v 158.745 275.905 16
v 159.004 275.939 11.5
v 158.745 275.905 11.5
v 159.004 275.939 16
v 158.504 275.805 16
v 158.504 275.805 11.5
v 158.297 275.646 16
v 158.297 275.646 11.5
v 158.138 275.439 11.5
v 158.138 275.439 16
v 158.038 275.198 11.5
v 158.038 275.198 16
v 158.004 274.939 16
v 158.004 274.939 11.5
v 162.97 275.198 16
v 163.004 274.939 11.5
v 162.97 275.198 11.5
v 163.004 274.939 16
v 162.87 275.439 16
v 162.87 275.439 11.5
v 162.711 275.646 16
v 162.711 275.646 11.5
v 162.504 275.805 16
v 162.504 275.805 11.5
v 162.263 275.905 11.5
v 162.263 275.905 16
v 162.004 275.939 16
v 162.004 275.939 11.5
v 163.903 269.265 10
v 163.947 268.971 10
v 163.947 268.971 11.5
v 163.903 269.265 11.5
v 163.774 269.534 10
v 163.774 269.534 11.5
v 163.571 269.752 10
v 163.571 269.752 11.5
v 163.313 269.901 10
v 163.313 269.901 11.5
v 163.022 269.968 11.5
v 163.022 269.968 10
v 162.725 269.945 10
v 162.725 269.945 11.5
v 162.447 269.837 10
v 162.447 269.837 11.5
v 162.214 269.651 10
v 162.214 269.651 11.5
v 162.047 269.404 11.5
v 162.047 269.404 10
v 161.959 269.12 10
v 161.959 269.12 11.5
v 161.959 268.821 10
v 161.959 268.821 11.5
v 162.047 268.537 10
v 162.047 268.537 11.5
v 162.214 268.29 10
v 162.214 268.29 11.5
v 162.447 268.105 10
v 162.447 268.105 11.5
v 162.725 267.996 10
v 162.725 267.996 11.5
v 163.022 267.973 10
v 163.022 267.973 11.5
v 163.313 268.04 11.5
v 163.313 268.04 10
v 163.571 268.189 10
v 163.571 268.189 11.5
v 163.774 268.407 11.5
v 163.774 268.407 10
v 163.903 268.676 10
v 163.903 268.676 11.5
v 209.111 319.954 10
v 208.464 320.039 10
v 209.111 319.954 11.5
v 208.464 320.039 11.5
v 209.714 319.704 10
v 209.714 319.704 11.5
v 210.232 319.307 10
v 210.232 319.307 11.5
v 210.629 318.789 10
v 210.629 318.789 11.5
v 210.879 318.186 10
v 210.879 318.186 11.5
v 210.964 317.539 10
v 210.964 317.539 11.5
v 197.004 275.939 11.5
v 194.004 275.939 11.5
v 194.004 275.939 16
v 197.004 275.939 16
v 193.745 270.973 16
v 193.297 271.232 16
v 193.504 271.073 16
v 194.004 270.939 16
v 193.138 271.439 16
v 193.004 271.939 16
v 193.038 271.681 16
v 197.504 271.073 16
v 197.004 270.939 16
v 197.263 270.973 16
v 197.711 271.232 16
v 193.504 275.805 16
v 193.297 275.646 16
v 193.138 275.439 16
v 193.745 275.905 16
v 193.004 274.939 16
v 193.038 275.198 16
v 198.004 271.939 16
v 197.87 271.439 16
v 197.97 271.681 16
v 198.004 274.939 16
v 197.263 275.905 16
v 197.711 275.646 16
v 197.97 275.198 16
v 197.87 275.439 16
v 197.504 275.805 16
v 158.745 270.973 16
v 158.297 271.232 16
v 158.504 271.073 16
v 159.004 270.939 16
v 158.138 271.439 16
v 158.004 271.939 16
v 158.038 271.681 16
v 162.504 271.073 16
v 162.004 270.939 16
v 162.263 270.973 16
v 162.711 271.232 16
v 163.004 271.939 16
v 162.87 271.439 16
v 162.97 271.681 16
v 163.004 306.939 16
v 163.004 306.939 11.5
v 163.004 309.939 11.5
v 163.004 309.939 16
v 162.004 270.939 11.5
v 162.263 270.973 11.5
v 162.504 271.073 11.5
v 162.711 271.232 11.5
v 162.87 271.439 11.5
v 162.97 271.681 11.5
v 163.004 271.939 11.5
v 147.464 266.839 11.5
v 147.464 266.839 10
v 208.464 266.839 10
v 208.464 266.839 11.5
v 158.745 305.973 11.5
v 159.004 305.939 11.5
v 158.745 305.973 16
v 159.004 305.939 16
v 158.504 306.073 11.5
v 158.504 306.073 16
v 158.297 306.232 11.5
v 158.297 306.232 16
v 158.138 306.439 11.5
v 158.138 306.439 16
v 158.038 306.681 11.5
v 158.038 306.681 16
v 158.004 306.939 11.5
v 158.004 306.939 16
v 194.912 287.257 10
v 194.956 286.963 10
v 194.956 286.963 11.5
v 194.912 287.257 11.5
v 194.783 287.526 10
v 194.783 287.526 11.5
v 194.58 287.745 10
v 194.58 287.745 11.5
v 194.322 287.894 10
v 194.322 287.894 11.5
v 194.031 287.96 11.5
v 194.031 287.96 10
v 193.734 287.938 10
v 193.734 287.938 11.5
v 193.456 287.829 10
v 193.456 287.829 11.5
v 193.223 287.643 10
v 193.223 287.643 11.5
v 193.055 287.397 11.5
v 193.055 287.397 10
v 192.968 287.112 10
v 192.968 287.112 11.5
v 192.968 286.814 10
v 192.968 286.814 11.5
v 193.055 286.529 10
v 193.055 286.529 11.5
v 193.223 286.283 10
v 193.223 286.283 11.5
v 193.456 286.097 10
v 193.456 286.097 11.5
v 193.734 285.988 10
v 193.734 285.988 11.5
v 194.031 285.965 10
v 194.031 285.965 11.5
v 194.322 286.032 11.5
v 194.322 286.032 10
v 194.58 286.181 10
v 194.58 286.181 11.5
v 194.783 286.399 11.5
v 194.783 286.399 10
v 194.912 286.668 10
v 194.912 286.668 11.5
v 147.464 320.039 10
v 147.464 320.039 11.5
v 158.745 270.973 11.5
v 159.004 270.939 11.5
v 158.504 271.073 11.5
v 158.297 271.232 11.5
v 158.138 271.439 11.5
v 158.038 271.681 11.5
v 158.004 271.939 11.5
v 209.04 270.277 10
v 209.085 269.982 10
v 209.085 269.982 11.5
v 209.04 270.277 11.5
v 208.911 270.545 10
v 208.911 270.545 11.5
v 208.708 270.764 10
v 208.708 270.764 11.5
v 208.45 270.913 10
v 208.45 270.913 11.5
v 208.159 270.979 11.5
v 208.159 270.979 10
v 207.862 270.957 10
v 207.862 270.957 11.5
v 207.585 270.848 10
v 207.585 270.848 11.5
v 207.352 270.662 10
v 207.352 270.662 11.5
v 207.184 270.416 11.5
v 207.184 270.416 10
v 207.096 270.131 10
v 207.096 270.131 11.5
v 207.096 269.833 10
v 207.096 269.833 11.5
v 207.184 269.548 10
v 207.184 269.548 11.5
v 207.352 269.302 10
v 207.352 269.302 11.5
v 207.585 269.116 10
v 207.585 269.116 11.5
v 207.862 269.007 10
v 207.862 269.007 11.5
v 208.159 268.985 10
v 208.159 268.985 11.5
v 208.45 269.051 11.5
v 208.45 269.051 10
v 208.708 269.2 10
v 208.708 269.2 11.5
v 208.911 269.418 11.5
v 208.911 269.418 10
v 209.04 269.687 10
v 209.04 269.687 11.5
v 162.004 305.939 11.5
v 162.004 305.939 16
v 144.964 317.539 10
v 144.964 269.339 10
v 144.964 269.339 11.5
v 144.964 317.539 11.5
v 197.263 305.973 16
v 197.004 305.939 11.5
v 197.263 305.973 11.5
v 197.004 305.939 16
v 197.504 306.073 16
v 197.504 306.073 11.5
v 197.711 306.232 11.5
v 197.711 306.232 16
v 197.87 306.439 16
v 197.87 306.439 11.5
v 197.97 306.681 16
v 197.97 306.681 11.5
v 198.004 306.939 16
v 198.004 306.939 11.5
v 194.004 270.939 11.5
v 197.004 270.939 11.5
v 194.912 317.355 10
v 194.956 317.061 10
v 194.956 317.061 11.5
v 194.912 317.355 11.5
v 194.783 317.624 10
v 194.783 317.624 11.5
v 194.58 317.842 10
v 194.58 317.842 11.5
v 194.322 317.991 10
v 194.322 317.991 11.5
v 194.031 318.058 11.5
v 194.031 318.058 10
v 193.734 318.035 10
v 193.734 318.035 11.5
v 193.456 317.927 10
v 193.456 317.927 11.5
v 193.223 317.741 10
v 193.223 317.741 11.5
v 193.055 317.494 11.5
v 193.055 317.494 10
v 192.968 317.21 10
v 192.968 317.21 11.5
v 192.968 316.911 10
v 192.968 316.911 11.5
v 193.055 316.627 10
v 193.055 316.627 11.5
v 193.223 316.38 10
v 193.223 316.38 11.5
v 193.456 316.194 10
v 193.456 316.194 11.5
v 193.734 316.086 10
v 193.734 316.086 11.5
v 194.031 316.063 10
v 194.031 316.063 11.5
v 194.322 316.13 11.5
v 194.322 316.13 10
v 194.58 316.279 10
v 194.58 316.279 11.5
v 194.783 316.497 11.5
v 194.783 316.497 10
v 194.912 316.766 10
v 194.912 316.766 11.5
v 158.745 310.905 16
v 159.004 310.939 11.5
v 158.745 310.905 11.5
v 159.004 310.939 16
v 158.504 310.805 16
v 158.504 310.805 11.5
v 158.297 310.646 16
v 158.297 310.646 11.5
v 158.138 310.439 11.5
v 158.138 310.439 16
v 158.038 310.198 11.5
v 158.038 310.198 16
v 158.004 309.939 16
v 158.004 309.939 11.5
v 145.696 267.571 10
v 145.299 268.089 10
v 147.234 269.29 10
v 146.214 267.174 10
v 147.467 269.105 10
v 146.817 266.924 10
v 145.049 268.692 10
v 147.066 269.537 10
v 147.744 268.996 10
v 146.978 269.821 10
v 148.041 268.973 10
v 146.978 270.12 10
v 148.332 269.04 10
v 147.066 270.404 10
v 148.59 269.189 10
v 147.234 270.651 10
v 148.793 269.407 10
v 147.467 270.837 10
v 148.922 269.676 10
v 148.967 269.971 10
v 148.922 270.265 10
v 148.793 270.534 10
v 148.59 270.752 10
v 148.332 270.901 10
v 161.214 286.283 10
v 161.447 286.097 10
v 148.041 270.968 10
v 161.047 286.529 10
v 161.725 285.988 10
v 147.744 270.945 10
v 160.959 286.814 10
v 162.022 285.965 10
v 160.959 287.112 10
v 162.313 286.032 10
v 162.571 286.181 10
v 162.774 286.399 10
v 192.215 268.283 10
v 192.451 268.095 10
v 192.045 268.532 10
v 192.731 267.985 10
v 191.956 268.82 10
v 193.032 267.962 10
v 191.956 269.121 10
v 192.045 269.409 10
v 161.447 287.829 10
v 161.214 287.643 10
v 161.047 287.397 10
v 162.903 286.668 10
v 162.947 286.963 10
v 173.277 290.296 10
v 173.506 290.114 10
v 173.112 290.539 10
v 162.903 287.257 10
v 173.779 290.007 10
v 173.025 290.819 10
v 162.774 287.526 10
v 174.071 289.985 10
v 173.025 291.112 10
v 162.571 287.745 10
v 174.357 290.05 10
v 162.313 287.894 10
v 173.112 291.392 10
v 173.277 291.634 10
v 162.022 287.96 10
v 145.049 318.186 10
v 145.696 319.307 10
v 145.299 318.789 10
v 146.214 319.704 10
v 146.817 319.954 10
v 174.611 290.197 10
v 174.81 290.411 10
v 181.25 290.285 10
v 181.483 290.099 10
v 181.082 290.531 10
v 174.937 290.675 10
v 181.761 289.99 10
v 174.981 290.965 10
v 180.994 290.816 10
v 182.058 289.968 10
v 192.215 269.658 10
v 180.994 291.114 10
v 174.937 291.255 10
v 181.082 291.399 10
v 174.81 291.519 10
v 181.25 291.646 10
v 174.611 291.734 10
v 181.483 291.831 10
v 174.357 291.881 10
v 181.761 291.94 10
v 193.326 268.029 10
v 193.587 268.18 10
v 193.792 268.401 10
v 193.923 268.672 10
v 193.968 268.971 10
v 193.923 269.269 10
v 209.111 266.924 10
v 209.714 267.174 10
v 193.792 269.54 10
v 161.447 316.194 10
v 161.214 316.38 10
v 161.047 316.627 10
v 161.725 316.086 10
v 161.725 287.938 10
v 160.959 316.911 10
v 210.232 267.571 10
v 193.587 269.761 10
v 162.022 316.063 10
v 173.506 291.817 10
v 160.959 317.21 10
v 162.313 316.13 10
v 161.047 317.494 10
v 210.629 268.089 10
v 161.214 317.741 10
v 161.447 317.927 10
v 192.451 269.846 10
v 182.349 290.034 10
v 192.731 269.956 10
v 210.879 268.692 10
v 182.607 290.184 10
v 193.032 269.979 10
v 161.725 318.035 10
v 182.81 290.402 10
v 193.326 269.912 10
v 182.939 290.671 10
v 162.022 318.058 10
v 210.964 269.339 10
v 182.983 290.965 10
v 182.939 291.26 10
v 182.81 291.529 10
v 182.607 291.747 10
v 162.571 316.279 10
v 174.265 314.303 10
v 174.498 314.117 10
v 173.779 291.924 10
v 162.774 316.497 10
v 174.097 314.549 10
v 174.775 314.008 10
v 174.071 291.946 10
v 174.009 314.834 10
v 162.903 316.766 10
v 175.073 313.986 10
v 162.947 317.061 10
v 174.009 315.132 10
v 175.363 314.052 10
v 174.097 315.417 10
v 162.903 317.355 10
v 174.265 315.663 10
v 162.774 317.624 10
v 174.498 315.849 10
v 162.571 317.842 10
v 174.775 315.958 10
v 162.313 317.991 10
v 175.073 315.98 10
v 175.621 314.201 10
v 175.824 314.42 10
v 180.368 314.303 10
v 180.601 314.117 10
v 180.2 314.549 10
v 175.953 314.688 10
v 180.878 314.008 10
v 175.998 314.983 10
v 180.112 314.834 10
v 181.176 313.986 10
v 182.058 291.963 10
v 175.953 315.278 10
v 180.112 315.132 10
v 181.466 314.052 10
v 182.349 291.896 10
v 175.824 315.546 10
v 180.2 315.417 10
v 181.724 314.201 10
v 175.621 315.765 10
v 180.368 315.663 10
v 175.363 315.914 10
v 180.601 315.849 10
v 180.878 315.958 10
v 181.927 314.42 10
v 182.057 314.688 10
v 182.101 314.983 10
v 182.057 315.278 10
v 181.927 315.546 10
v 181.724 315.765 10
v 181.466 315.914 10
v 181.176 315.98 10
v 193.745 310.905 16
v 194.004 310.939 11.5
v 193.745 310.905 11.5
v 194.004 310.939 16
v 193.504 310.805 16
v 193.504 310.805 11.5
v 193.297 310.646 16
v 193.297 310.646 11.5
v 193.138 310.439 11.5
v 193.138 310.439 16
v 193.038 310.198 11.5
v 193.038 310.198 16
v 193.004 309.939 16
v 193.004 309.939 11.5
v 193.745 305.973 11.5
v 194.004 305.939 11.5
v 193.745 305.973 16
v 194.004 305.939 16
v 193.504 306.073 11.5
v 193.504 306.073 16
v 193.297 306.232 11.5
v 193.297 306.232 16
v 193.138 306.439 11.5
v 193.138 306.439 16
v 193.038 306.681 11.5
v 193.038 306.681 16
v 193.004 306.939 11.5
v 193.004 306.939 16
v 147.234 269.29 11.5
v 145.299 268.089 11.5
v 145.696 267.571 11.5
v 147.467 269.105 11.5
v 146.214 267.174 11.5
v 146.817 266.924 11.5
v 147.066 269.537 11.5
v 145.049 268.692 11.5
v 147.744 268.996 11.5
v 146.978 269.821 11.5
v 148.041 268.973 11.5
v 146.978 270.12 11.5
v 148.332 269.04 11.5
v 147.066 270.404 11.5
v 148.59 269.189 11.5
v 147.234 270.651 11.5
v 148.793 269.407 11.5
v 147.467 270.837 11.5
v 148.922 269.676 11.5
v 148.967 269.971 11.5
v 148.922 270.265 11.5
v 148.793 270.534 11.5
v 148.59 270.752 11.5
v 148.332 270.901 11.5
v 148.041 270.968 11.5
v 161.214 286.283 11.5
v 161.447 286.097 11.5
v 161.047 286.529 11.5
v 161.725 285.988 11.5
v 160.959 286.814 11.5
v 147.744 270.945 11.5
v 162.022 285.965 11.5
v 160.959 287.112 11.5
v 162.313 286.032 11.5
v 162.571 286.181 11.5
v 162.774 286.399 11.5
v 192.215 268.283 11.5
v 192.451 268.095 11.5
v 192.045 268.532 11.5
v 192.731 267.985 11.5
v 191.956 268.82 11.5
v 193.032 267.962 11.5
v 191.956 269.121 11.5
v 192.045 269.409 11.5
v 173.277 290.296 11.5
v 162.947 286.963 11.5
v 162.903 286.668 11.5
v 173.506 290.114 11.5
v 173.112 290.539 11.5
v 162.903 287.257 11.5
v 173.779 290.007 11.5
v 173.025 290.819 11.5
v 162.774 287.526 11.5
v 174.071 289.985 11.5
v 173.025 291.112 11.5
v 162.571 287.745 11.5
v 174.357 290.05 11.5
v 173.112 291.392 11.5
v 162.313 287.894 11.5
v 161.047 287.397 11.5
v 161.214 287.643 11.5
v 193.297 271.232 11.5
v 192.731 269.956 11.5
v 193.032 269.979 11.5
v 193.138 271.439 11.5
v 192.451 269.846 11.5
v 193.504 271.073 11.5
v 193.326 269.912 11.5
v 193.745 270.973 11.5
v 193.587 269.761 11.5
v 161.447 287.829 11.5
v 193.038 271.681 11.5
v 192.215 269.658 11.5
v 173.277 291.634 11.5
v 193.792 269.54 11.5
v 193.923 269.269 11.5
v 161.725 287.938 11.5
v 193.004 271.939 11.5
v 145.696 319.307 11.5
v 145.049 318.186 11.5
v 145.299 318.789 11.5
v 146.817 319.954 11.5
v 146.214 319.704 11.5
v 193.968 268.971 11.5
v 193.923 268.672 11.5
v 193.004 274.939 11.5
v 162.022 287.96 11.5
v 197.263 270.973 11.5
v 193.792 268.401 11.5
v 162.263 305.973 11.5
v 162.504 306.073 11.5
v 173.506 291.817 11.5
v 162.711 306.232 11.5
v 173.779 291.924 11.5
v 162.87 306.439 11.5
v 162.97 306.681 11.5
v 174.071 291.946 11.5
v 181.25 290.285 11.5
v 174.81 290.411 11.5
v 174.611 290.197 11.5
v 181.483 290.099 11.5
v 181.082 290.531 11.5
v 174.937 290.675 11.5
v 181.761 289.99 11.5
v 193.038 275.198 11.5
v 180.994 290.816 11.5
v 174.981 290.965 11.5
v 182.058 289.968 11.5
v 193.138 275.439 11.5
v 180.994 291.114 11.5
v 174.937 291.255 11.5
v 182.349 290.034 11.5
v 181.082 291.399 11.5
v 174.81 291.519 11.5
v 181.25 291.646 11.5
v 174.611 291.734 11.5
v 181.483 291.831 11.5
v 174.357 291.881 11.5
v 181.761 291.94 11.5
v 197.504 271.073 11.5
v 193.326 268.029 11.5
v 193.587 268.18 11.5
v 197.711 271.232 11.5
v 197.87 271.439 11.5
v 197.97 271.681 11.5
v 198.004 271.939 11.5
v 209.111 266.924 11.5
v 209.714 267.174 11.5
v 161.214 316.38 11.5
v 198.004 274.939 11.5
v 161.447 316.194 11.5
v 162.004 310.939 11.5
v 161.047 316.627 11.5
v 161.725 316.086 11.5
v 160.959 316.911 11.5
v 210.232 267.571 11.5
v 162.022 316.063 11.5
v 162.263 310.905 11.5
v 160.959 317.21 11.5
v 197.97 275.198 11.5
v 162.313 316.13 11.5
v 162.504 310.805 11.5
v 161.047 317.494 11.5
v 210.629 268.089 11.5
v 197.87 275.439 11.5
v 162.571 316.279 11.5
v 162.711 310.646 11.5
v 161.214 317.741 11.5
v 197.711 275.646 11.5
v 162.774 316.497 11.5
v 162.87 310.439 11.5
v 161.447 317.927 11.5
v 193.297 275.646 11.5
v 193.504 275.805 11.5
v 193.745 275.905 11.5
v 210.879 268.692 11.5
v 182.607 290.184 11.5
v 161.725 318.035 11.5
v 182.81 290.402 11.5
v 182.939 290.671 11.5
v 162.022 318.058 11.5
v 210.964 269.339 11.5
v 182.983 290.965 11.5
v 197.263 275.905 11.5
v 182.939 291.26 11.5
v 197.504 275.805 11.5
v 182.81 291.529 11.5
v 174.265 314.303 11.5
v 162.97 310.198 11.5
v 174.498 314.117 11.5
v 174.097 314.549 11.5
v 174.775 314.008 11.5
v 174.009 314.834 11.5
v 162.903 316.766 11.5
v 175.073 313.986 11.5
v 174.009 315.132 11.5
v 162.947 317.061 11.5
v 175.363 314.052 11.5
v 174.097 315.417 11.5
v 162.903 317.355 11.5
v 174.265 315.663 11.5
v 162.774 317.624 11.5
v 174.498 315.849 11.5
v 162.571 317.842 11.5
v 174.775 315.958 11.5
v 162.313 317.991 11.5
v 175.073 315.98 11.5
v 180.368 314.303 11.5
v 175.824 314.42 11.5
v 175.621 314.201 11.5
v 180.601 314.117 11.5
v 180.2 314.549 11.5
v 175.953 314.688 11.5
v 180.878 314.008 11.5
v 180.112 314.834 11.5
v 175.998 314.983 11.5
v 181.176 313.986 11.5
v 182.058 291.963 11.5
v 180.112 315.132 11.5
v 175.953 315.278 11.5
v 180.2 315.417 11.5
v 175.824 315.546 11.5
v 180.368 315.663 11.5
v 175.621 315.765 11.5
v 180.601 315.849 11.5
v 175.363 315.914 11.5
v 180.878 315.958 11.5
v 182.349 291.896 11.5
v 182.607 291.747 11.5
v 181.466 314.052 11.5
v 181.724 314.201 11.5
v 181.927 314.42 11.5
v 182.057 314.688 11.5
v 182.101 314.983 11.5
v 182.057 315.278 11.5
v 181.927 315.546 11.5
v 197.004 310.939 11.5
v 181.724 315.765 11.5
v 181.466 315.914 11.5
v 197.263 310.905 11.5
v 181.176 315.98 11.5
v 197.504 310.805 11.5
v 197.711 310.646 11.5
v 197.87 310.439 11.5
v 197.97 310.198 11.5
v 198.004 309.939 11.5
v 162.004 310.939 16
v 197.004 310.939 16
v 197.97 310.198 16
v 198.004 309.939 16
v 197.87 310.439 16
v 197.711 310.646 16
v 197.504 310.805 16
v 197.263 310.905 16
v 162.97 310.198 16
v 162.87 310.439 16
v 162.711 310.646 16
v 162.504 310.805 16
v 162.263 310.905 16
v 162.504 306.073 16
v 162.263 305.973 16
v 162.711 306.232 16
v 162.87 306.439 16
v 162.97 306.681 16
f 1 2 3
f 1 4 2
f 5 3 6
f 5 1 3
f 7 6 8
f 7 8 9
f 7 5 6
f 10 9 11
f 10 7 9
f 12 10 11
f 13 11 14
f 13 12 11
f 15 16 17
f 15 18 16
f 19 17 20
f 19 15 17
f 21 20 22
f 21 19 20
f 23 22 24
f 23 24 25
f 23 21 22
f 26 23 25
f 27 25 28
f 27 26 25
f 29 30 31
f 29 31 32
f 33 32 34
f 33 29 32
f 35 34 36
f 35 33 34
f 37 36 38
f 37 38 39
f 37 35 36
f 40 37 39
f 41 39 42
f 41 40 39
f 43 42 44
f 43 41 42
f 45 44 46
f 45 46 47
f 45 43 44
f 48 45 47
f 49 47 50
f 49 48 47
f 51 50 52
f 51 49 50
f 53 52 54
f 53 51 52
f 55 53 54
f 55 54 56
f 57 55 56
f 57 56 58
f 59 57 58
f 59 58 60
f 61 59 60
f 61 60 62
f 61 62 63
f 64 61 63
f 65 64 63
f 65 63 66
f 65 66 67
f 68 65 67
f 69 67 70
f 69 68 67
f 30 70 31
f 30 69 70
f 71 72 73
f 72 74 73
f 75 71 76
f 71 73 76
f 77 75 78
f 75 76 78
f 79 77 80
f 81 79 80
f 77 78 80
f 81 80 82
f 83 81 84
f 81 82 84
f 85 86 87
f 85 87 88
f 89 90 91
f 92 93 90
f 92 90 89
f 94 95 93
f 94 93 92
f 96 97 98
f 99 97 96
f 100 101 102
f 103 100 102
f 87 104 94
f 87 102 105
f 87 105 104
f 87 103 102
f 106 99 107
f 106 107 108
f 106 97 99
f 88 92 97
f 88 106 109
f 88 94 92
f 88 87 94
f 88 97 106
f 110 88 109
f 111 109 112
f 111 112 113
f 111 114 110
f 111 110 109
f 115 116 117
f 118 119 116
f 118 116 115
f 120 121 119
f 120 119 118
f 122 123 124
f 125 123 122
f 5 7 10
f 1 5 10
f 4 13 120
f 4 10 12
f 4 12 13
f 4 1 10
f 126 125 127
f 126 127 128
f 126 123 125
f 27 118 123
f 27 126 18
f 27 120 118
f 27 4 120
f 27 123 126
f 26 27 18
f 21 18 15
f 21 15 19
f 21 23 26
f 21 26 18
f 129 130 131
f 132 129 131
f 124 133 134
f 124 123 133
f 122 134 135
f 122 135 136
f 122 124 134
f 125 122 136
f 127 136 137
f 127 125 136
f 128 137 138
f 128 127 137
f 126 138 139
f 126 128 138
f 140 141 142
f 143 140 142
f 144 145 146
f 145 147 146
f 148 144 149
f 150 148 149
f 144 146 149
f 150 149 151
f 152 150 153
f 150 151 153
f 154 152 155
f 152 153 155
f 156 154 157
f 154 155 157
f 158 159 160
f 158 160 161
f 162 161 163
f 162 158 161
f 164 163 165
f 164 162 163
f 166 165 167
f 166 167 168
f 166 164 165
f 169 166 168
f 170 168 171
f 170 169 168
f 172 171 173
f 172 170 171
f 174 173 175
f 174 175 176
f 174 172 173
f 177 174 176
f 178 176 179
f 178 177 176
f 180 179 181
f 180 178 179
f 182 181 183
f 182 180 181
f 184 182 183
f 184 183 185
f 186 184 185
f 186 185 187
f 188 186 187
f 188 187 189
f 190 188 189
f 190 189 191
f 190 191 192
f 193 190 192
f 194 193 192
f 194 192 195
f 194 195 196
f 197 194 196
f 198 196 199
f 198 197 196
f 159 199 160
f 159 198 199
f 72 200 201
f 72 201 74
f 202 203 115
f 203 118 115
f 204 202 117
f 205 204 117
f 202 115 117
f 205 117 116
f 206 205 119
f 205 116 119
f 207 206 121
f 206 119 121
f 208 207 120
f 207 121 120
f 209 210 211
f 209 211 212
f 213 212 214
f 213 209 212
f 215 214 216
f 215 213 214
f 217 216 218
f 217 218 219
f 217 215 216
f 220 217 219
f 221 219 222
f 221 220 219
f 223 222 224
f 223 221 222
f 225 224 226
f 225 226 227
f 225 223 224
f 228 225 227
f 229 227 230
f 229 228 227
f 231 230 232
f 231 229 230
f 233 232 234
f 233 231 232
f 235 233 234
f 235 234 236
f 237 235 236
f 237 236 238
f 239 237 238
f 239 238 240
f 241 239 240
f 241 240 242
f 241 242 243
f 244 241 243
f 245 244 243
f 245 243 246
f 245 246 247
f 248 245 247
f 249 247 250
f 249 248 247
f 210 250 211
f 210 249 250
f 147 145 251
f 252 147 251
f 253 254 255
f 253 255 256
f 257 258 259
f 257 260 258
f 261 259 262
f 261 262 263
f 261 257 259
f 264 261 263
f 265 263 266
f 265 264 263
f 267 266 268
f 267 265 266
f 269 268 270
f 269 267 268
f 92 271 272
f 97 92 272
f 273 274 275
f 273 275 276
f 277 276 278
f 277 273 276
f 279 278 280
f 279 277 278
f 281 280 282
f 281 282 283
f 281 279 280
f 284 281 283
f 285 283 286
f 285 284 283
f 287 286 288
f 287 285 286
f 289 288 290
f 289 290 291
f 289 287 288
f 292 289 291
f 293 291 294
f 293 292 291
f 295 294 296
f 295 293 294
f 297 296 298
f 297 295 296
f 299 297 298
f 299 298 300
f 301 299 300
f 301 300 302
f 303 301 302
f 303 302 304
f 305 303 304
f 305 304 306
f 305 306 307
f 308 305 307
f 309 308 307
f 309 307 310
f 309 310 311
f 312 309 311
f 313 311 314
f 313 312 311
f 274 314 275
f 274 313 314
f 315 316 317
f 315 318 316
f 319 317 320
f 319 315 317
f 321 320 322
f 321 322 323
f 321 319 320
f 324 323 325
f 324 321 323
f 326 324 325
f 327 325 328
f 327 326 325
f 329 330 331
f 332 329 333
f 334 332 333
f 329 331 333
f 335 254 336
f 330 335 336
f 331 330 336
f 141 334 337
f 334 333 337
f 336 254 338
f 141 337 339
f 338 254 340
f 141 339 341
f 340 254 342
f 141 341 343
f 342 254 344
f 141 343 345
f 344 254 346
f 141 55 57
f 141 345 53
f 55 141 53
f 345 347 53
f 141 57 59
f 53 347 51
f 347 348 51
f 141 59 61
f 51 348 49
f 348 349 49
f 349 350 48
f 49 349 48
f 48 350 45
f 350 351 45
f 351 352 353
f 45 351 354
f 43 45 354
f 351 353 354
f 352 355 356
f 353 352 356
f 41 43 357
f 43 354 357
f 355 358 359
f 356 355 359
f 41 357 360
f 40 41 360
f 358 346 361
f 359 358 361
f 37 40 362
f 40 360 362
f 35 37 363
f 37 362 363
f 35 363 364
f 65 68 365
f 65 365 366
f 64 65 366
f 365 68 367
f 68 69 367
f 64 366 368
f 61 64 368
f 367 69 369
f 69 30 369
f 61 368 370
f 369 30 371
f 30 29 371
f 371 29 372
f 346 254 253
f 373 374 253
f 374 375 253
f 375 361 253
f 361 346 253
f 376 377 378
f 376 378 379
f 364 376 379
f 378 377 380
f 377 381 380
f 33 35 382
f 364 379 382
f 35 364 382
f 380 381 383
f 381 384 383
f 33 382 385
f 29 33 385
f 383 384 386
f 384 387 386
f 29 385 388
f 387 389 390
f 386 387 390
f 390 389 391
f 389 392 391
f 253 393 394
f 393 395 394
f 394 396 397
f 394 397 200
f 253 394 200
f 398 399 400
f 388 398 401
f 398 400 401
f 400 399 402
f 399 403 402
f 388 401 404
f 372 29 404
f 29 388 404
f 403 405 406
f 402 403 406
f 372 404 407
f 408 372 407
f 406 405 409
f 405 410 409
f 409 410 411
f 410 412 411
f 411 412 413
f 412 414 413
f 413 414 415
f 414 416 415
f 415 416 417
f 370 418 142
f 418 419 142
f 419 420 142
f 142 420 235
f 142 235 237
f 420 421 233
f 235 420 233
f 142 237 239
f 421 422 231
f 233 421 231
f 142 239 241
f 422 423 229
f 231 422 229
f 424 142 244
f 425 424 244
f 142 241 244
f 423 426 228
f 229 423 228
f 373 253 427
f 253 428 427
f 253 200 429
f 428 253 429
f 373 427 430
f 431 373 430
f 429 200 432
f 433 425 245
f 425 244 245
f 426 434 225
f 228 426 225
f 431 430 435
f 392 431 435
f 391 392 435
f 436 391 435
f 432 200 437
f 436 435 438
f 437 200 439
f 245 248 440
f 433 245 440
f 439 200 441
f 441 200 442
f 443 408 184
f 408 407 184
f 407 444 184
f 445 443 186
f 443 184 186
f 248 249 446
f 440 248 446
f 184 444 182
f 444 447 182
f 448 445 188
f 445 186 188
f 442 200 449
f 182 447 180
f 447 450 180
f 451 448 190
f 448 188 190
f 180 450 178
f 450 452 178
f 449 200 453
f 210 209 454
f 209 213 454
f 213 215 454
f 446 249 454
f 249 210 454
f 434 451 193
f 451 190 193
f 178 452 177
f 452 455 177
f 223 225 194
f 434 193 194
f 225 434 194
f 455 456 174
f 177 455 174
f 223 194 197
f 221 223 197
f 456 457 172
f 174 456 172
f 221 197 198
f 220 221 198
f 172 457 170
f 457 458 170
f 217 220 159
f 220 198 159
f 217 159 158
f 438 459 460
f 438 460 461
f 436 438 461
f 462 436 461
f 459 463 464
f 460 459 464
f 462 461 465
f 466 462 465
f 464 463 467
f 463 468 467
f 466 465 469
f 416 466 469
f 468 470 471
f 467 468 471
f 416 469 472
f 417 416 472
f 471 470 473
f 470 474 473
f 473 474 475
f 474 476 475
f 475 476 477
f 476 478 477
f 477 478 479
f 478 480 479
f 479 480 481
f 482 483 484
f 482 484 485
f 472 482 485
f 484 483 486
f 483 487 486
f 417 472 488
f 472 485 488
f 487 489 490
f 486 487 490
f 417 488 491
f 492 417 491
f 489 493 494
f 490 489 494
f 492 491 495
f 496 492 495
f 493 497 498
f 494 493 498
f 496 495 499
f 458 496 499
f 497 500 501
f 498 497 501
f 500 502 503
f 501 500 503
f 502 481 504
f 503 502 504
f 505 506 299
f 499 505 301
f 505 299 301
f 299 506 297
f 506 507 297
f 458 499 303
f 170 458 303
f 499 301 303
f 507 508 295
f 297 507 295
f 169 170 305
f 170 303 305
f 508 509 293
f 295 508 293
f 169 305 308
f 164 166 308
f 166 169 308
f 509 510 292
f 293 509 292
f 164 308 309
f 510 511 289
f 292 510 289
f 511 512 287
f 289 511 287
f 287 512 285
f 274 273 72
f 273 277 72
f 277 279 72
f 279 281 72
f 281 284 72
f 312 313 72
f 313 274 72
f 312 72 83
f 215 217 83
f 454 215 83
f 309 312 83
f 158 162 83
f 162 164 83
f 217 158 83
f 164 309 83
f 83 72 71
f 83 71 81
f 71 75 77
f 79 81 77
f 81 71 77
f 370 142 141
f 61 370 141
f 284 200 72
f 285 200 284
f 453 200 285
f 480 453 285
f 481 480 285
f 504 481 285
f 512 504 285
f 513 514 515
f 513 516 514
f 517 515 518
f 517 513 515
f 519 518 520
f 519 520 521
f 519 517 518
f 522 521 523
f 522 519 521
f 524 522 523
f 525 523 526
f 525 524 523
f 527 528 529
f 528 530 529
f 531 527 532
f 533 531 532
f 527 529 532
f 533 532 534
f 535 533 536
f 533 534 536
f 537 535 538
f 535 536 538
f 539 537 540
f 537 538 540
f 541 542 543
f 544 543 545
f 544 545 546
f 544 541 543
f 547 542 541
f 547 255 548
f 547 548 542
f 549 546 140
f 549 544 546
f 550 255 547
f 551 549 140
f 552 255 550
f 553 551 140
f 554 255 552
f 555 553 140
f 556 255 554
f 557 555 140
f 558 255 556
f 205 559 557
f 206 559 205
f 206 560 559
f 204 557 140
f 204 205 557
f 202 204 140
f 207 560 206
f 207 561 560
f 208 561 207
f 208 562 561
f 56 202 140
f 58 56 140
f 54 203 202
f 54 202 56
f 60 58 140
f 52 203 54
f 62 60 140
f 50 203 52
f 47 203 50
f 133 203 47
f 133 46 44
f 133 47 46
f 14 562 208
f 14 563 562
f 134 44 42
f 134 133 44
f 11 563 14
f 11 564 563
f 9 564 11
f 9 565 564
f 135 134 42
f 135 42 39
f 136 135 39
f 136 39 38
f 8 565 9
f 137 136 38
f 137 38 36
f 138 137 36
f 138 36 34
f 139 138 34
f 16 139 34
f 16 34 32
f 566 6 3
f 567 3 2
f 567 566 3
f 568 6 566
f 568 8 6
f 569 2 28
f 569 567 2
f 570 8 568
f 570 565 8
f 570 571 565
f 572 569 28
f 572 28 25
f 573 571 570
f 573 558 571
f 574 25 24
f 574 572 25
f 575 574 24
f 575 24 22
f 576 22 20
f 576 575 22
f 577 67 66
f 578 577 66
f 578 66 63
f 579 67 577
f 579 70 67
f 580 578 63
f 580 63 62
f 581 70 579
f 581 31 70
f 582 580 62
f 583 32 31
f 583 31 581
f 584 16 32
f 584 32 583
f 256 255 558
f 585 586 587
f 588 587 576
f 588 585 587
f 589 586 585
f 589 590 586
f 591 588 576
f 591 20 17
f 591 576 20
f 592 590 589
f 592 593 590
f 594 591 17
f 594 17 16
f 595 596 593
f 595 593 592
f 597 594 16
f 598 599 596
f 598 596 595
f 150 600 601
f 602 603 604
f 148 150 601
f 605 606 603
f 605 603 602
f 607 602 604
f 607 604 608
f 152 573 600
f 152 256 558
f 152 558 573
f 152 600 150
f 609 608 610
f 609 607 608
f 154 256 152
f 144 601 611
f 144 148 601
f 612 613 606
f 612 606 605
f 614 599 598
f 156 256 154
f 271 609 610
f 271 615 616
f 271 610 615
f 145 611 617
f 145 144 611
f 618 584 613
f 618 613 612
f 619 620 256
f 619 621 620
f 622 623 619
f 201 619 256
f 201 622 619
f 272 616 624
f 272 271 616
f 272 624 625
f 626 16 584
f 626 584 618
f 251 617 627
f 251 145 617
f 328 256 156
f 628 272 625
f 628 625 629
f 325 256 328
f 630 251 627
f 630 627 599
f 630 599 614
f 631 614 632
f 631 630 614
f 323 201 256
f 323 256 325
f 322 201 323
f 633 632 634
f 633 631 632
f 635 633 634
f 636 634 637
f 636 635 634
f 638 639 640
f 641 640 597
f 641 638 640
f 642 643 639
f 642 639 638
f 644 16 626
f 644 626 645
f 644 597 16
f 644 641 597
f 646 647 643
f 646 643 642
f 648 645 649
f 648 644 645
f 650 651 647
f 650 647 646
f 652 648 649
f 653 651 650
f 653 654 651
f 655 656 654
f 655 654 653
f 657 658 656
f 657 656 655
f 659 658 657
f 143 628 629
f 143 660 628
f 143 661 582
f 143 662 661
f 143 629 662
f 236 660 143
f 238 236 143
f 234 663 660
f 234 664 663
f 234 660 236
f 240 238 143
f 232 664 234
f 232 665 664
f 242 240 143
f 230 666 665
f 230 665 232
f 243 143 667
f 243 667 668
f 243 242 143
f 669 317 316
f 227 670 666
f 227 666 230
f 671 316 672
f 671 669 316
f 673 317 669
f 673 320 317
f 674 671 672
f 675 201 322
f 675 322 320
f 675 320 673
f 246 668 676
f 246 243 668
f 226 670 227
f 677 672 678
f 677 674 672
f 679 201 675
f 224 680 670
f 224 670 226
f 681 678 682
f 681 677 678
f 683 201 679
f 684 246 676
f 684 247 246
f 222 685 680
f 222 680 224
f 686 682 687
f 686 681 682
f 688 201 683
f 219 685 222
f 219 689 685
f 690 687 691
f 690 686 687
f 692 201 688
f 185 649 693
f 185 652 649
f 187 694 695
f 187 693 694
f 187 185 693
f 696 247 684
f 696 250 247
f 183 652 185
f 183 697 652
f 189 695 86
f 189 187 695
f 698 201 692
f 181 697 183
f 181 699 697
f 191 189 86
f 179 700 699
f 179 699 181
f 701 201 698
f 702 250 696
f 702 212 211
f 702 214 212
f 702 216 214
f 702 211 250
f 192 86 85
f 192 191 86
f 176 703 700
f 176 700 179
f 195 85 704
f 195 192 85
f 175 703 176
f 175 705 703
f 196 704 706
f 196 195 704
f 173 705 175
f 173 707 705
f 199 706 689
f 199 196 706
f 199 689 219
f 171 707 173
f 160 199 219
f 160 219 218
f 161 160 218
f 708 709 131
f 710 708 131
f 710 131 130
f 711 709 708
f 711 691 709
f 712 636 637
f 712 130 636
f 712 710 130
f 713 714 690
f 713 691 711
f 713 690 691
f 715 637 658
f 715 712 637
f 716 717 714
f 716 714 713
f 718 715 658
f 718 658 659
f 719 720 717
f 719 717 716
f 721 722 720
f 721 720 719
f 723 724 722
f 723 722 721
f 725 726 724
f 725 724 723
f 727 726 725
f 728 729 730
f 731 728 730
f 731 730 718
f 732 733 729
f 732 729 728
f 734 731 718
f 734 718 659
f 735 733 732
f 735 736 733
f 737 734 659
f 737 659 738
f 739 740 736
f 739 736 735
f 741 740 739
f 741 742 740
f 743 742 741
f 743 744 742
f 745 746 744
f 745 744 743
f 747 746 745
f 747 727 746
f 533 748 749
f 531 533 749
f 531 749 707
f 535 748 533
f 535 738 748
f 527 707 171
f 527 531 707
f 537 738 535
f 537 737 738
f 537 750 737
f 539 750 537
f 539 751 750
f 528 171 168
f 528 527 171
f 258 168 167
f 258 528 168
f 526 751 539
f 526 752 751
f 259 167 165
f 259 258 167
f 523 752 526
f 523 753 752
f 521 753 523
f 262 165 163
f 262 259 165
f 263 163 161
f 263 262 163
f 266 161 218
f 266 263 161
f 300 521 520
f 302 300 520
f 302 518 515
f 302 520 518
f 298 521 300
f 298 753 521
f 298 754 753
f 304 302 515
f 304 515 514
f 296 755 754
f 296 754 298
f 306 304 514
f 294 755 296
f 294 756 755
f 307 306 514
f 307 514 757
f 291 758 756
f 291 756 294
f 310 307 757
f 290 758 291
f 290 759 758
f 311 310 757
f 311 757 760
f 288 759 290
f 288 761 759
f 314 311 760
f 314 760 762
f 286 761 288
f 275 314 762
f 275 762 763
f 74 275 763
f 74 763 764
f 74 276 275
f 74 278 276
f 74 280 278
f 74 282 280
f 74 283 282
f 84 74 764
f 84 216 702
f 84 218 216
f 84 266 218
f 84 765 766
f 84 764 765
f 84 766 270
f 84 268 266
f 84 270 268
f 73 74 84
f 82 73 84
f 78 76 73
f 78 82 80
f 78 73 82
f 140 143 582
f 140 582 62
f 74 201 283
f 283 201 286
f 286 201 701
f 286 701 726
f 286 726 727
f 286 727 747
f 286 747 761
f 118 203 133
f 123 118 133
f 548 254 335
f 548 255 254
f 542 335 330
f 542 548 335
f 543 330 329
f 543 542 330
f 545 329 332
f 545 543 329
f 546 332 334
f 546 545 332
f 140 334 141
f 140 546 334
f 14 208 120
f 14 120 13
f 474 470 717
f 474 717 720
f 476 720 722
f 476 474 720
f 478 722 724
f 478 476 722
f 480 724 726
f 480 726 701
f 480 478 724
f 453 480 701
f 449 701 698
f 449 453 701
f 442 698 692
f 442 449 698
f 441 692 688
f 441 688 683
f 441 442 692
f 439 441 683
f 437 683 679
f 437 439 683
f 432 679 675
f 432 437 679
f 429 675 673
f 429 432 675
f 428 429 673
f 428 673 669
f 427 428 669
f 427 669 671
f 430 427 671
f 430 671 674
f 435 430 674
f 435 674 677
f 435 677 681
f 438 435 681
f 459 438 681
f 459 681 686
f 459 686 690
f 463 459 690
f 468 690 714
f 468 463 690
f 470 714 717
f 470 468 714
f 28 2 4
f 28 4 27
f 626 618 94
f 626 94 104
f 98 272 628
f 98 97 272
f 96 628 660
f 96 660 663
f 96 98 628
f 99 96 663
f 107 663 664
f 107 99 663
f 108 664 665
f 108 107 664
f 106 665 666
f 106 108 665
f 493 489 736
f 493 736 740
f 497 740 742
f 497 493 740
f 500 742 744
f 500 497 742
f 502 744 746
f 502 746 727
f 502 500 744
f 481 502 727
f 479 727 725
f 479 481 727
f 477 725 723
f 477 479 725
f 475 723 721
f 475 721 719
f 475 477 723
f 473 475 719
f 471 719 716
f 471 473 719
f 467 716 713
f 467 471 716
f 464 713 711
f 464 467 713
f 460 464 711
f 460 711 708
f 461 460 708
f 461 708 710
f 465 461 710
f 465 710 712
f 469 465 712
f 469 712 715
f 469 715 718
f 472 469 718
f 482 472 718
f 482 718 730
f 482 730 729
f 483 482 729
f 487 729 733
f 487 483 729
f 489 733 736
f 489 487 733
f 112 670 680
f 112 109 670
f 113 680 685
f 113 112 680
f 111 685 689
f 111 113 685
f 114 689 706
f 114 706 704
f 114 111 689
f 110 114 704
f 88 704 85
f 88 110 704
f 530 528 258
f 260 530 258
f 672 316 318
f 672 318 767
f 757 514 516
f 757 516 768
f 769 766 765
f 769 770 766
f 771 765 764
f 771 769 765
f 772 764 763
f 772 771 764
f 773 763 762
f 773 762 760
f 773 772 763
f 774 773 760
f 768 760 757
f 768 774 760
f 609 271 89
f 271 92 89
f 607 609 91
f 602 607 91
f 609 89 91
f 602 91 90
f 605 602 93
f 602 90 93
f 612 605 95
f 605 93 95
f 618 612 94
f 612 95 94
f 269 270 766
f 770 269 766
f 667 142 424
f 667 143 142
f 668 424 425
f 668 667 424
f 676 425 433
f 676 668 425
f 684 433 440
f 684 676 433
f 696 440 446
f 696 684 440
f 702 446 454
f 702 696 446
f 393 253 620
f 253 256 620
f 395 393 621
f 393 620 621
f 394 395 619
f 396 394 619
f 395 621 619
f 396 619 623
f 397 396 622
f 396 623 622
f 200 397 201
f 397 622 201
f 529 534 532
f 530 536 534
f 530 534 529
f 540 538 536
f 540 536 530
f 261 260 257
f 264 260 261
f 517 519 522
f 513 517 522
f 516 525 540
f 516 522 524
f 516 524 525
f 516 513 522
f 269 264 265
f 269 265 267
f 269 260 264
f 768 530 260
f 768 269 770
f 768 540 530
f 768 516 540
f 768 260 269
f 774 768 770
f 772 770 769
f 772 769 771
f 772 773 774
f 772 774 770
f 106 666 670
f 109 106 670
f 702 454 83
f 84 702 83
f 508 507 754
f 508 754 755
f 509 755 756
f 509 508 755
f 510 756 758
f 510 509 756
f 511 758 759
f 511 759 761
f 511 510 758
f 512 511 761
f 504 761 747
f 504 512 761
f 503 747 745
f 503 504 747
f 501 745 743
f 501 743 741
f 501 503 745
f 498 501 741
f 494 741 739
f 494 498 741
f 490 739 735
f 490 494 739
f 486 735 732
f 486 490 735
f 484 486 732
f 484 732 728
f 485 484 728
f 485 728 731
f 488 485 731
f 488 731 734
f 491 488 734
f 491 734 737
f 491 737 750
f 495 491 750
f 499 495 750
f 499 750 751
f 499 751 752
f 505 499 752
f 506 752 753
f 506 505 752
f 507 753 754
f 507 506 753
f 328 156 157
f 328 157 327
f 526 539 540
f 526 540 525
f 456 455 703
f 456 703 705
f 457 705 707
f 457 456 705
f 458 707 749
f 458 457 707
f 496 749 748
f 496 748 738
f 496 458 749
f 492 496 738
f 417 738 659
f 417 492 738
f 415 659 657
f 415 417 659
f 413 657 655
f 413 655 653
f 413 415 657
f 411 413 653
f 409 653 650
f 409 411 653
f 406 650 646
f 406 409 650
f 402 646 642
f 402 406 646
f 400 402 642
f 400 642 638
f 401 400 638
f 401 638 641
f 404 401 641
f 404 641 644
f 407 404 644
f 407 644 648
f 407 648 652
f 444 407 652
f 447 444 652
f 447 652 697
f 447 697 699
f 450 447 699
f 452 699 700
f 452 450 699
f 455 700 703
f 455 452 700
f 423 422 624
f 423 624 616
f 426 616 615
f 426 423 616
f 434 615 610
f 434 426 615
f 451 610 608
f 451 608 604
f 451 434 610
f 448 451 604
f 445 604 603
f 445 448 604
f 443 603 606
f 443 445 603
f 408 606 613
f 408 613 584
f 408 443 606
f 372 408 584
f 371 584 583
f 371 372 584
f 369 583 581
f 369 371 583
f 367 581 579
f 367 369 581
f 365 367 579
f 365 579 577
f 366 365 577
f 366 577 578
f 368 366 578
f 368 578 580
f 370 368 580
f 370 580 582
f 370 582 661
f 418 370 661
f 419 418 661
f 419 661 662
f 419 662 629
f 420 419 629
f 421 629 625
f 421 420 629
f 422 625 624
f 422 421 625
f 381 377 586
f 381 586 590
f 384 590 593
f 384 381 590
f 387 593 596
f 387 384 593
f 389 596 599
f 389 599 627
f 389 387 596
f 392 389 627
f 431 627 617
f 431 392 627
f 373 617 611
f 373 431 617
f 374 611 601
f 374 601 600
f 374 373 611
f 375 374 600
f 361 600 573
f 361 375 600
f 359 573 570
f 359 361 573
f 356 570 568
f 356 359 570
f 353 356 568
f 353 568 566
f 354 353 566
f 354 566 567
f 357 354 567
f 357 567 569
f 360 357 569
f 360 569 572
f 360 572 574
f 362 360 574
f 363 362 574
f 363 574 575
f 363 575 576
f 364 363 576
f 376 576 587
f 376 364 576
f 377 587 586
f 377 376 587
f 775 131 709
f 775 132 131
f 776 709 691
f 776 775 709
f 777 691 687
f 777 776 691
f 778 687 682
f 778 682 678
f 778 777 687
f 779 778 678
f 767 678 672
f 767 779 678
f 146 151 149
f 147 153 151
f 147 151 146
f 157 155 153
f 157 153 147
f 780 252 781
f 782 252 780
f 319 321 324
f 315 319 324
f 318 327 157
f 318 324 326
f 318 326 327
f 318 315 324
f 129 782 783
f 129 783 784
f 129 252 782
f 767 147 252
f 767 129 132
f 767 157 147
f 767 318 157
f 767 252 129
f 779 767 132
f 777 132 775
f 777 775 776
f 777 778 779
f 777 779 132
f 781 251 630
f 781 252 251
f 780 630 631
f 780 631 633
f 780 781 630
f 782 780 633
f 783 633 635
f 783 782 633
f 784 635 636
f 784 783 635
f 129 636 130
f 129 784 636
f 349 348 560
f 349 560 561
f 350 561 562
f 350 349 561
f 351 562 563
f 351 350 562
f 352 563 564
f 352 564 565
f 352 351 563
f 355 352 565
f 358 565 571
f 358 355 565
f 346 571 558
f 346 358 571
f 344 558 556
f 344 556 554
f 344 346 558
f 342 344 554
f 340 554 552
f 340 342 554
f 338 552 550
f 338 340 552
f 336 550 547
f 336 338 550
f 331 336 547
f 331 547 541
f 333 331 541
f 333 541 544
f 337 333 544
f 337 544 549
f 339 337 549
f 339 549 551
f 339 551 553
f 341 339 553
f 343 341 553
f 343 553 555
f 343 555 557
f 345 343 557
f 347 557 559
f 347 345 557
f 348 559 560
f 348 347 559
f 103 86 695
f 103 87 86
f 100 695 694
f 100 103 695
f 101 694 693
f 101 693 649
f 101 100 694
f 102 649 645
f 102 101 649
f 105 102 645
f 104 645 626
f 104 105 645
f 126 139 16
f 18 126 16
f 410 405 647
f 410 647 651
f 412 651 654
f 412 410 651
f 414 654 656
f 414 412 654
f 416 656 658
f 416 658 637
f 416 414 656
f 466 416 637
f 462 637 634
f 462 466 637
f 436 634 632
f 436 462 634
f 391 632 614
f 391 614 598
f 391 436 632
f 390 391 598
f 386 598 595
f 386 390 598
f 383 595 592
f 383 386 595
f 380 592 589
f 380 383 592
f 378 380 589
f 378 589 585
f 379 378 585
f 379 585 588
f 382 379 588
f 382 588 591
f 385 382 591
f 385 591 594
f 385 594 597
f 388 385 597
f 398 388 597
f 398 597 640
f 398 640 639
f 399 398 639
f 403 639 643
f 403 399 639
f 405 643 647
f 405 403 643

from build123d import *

# Parameters (mm, degrees)
SKETCH1_W           = 66
SKETCH1_H           = 53.2
SKETCH1_R           = 1
SKETCH1_R_2         = 0.98333
SKETCH1_R_3         = 1.011270727
BOSS_EXTRUDE1_DEPTH = 1.5
SKETCH2_W           = 5
SKETCH2_H           = 5
BOSS_EXTRUDE2_DEPTH = 4.5
FILLET1_R           = 1
FILLET2_R           = 2.5


with BuildPart() as part:
    # Sketch1 → Boss-Extrude1 (new body)
    with BuildSketch(Plane.XY.offset(10)):
        with Locations((177.963936399, 293.439054482)):
            Rectangle(SKETCH1_W, SKETCH1_H)
        with Locations((161.947495, 317.06050799)):
            Circle(SKETCH1_R, mode=Mode.SUBTRACT)
        with Locations((193.956452611, 317.06050799)):
            Circle(SKETCH1_R, mode=Mode.SUBTRACT)
        with Locations((174.997800233, 314.982847455)):
            Circle(SKETCH1_R, mode=Mode.SUBTRACT)
        with Locations((181.100928053, 314.982847455)):
            Circle(SKETCH1_R, mode=Mode.SUBTRACT)
        with Locations((173.997800233, 290.965333254)):
            Circle(SKETCH1_R_2, mode=Mode.SUBTRACT)
        with Locations((181.983306885, 290.965333254)):
            Circle(SKETCH1_R, mode=Mode.SUBTRACT)
        with Locations((161.947495, 286.962677261)):
            Circle(SKETCH1_R, mode=Mode.SUBTRACT)
        with Locations((193.956452611, 286.962677261)):
            Circle(SKETCH1_R, mode=Mode.SUBTRACT)
        with Locations((162.947495, 268.970540104)):
            Circle(SKETCH1_R, mode=Mode.SUBTRACT)
        with Locations((192.956452611, 268.970540104)):
            Circle(SKETCH1_R_3, mode=Mode.SUBTRACT)
        with Locations((208.084556857, 269.981810832)):
            Circle(SKETCH1_R, mode=Mode.SUBTRACT)
        with Locations((147.966567684, 269.970540104)):
            Circle(SKETCH1_R, mode=Mode.SUBTRACT)
    extrude(amount=BOSS_EXTRUDE1_DEPTH)

    # Sketch2 → Boss-Extrude2 (add)
    with BuildSketch(Plane.XY.offset(11.5)):
        with Locations((195.50417089, 308.439334712)):
            Rectangle(SKETCH2_W, SKETCH2_H)
        with Locations((160.50417089, 308.439334712)):
            Rectangle(SKETCH2_W, SKETCH2_H)
        with Locations((195.50417089, 273.439334712)):
            Rectangle(SKETCH2_W, SKETCH2_H)
        with Locations((160.50417089, 273.439334712)):
            Rectangle(SKETCH2_W, SKETCH2_H)
    extrude(amount=BOSS_EXTRUDE2_DEPTH)

    # Fillet1
    fillet1_edges = [part.edges().sort_by_distance(p)[0] for p in [
        (163.00417089, 275.939334712, 13.75),
        (158.00417089, 275.939334712, 13.75),
        (158.00417089, 270.939334712, 13.75),
        (163.00417089, 270.939334712, 13.75),
        (158.00417089, 310.939334712, 13.75),
        (158.00417089, 305.939334712, 13.75),
        (163.00417089, 305.939334712, 13.75),
        (163.00417089, 310.939334712, 13.75),
        (198.00417089, 310.939334712, 13.75),
        (193.00417089, 310.939334712, 13.75),
        (193.00417089, 305.939334712, 13.75),
        (198.00417089, 305.939334712, 13.75),
        (198.00417089, 275.939334712, 13.75),
        (193.00417089, 275.939334712, 13.75),
        (193.00417089, 270.939334712, 13.75),
        (198.00417089, 270.939334712, 13.75),
    ]]
    fillet(fillet1_edges, radius=FILLET1_R)

    # Fillet2
    fillet2_edges = [part.edges().sort_by_distance(p)[0] for p in [
        (144.963936399, 320.039054482, 10.75),
        (210.963936399, 320.039054482, 10.75),
        (210.963936399, 266.839054482, 10.75),
        (144.963936399, 266.839054482, 10.75),
    ]]
    fillet(fillet2_edges, radius=FILLET2_R)


solid = part.part
